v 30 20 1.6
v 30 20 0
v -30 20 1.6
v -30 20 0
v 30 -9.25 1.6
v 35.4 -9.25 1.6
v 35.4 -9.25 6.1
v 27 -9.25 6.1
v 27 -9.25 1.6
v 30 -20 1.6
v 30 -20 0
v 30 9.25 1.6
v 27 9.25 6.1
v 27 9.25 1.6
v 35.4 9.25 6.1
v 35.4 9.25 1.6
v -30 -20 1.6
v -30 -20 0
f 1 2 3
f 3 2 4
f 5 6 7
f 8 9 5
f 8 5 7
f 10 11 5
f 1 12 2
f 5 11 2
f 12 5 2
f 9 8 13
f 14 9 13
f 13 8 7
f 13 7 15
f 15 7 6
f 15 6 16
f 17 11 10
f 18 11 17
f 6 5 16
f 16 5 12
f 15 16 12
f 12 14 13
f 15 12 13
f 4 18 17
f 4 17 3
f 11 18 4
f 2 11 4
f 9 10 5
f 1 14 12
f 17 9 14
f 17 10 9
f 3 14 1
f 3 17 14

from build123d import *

# Parameters (mm, degrees)
SKETCH1_W                = 40
SKETCH1_H                = 60
BOSS_EXTRUDE1_DEPTH      = 1.6
BOSS_EXTRUDE2_DEPTH      = 5.4
BOSS_EXTRUDE2_DEPTH_BACK = 3
SKETCH2_W                = 18.5
SKETCH2_H                = 4.5


with BuildPart() as part:
    # Sketch1 → Boss-Extrude1 (new body)
    with BuildSketch(Plane(origin=(0, 0, 0), x_dir=(0, 1, 0), z_dir=(0, 0, 1))):
        Rectangle(SKETCH1_W, SKETCH1_H)
    extrude(amount=BOSS_EXTRUDE1_DEPTH)

    # Sketch2 → Boss-Extrude2 (add, two sides: drawn at the far end of the back side and taken through both)
    with BuildSketch(Plane.YZ.offset(30).offset(-BOSS_EXTRUDE2_DEPTH_BACK)):
        with Locations((0, 3.85)):
            Rectangle(SKETCH2_W, SKETCH2_H)
    extrude(amount=BOSS_EXTRUDE2_DEPTH + BOSS_EXTRUDE2_DEPTH_BACK)


solid = part.part
